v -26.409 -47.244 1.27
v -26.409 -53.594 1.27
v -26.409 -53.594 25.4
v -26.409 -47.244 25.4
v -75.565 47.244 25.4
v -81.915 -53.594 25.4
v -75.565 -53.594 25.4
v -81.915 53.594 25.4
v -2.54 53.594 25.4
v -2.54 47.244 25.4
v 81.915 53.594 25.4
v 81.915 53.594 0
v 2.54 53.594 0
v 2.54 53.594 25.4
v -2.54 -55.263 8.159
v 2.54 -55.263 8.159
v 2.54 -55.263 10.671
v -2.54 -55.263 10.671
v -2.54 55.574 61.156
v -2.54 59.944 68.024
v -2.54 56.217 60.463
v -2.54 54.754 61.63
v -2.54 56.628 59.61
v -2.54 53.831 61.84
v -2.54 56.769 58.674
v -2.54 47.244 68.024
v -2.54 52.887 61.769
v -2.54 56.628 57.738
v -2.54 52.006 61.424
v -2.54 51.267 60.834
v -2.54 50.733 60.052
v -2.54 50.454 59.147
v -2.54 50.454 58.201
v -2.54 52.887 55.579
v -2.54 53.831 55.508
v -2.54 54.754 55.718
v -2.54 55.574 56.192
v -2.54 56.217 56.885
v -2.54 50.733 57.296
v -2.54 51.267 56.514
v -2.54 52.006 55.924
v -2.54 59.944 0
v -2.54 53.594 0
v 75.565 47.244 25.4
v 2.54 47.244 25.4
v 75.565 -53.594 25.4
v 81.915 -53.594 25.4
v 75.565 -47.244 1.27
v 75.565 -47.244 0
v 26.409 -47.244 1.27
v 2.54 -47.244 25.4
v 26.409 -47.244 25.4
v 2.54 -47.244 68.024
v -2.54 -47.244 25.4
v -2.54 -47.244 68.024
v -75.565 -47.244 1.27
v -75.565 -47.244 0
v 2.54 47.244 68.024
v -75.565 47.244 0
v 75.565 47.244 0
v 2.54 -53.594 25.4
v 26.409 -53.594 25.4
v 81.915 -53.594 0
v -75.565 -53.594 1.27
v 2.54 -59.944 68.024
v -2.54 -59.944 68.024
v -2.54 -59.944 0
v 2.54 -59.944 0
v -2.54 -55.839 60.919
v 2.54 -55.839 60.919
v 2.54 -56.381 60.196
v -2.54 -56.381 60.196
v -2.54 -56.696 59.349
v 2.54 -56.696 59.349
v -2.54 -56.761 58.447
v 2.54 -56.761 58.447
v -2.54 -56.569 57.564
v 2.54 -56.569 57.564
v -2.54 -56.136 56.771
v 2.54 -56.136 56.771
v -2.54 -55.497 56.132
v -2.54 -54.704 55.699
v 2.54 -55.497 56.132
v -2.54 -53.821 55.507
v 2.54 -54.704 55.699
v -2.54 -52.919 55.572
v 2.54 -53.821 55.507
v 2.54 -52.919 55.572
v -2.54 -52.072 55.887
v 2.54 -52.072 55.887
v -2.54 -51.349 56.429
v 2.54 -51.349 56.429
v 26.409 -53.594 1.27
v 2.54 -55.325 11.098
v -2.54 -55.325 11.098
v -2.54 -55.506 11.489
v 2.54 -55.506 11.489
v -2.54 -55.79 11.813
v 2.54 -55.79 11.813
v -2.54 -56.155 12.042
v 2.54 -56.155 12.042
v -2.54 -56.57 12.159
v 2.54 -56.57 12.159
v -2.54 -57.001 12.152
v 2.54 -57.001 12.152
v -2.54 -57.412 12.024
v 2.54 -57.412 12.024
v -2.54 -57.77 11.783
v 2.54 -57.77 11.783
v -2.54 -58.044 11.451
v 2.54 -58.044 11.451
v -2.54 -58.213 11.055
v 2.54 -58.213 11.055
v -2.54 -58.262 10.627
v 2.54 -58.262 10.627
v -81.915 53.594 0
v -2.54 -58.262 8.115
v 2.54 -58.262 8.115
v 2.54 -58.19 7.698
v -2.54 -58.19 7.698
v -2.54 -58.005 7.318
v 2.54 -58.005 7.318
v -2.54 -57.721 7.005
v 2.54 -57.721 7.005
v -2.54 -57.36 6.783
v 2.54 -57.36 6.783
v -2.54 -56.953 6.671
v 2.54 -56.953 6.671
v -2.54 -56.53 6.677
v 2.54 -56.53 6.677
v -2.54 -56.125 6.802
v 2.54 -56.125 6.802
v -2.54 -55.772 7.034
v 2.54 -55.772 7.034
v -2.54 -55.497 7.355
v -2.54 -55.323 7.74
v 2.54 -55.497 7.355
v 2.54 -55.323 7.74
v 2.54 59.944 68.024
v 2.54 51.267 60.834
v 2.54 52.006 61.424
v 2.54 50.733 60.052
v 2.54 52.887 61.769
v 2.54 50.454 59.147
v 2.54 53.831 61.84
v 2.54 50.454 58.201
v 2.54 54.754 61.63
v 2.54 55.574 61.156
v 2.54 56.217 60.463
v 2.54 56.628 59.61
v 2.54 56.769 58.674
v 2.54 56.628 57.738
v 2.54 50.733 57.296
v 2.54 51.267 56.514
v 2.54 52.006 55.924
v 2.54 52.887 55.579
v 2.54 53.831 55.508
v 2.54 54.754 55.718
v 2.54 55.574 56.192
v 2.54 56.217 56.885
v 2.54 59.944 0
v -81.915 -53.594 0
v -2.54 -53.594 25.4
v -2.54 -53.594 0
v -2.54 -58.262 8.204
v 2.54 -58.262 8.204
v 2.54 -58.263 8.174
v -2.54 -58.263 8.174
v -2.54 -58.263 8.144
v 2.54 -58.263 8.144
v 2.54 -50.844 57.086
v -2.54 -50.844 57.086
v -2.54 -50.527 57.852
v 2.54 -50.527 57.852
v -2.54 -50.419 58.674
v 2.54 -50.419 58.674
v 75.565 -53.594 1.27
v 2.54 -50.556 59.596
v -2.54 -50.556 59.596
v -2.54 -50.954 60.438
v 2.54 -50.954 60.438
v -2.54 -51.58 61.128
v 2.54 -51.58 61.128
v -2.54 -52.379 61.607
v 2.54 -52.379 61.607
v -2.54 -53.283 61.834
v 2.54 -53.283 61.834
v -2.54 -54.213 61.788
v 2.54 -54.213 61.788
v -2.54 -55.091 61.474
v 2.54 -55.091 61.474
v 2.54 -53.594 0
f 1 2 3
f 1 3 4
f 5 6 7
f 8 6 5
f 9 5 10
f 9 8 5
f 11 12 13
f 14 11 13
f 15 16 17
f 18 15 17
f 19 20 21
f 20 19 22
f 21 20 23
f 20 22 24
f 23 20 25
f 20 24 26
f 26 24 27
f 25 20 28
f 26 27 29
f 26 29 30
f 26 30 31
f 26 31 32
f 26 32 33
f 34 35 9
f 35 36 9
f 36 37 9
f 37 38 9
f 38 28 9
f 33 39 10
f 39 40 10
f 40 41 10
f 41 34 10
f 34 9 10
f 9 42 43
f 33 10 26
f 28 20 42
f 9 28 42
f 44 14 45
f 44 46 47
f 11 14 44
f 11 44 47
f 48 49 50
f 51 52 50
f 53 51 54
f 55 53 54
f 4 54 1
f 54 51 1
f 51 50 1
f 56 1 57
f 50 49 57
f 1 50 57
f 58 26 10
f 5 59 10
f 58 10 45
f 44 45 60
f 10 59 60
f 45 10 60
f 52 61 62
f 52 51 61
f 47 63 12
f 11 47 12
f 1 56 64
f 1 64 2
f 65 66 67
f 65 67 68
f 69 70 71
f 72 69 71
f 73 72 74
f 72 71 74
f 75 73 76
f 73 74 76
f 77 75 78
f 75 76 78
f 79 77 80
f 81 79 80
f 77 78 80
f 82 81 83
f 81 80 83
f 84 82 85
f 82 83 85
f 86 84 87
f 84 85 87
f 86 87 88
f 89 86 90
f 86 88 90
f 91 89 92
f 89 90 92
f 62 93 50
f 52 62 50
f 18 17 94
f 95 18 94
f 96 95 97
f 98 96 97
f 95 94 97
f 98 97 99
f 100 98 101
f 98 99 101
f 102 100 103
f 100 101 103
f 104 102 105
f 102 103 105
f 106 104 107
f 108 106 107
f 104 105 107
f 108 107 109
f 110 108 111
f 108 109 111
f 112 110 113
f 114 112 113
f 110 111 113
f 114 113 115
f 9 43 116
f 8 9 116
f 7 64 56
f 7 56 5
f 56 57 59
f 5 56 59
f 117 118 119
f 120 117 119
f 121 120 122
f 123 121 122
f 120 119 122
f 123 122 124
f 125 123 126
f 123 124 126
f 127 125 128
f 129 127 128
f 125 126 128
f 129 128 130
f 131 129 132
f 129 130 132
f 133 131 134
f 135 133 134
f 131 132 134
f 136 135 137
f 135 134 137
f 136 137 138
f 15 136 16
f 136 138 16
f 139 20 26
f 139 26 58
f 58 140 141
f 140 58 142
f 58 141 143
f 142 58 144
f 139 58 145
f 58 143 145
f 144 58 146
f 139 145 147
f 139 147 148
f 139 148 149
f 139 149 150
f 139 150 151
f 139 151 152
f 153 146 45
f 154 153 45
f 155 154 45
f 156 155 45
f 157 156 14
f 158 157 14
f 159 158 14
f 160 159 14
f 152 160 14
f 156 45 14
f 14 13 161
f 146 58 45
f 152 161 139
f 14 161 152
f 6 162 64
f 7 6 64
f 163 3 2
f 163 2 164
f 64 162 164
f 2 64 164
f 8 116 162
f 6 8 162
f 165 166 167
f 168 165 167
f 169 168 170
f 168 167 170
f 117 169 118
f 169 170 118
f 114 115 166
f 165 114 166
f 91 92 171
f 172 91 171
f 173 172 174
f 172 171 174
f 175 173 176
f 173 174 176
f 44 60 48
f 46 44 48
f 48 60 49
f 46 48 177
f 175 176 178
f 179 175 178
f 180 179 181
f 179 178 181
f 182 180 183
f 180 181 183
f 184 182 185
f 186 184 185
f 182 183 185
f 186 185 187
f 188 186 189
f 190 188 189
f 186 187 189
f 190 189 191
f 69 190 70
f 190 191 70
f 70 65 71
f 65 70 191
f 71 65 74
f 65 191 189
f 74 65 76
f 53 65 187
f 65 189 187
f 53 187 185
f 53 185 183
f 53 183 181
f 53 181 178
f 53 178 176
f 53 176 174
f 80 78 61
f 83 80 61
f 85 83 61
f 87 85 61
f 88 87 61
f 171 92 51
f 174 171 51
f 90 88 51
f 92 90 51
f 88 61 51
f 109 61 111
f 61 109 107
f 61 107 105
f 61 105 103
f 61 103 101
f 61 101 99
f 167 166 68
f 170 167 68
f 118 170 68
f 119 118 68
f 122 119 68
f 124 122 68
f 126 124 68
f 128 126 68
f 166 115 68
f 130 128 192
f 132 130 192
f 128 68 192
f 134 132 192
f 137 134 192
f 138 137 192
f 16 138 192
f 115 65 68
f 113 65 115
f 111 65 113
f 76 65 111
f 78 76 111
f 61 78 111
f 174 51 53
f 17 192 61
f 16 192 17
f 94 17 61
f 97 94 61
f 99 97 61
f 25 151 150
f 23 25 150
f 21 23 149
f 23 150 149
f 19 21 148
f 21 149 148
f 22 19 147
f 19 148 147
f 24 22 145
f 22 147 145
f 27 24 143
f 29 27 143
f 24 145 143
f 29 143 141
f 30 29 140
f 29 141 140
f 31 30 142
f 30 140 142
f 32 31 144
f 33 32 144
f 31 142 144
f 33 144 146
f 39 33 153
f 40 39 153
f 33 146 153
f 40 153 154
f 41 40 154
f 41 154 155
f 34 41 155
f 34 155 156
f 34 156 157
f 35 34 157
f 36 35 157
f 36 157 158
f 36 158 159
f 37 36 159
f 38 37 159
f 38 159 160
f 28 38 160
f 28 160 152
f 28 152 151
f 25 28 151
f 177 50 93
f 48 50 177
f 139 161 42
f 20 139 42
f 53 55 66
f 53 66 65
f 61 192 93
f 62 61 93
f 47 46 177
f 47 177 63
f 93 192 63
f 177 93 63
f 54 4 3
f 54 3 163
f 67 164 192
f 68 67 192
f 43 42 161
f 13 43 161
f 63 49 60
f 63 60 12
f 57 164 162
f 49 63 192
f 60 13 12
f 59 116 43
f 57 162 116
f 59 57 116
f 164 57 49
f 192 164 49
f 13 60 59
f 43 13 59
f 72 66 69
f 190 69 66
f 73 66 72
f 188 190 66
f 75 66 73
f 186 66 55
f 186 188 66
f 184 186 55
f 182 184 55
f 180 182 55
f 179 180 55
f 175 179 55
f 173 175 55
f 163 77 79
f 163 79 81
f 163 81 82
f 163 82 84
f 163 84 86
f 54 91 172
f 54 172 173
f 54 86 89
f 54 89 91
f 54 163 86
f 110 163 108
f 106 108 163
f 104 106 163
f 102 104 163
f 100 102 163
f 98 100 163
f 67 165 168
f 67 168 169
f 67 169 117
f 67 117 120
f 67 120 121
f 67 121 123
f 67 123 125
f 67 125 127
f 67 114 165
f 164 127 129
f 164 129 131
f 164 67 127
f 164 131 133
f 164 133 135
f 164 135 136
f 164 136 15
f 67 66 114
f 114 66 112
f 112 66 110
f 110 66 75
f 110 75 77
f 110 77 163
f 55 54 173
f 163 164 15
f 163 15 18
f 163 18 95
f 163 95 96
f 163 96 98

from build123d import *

# Parameters (mm, degrees)
F0_W     = 49.1559793526
F0_H     = 6.35
F0_W_2   = 5.08
F0_W_3   = 23.8690206474
F1_DEPTH = 1.27
F2_DEPTH = 25.4
F3_W     = 5.08
F3_H     = 12.7
F4_DEPTH = 42.624
F6_DEPTH = 25.4
F7_R     = 3.175
F8_DEPTH = 25.4


with BuildPart() as f1:
    # F0 (on Top) → F1 (new body)
    with BuildSketch(Plane.XY):
        with Locations((-50.9870103237, -50.419)):
            Rectangle(F0_W, F0_H)
        Polygon((-75.565, 47.244), (-2.54, 47.244), (-2.54, 53.594), (-81.915, 53.594), (-81.915, -53.594), (-75.565, -53.594), (-75.565, -47.244), align=None)
        with Locations((0, 56.769)):
            Rectangle(F0_W_2, F0_H)
        with Locations((0, 50.419)):
            Rectangle(F0_W_2, F0_H)
        Polygon((2.54, 47.244), (75.565, 47.244), (75.565, -47.244), (75.565, -53.594), (81.915, -53.594), (81.915, 53.594), (2.54, 53.594), align=None)
        with Locations((50.9870103237, -50.419)):
            Rectangle(F0_W, F0_H)
        with Locations((-14.4745103237, -50.419)):
            Rectangle(F0_W_3, F0_H)
        with Locations((0, -50.419)):
            Rectangle(F0_W_2, F0_H)
        with Locations((14.4745103237, -50.419)):
            Rectangle(F0_W_3, F0_H)
        with Locations((0, -56.769)):
            Rectangle(F0_W_2, F0_H)
    extrude(amount=F1_DEPTH)

    # F0 (on Top) → F2 (join)
    with BuildSketch(Plane.XY):
        Polygon((-75.565, 47.244), (-2.54, 47.244), (-2.54, 53.594), (-81.915, 53.594), (-81.915, -53.594), (-75.565, -53.594), (-75.565, -47.244), align=None)
        with Locations((0, 56.769)):
            Rectangle(F0_W_2, F0_H)
        with Locations((0, 50.419)):
            Rectangle(F0_W_2, F0_H)
        Polygon((2.54, 47.244), (75.565, 47.244), (75.565, -47.244), (75.565, -53.594), (81.915, -53.594), (81.915, 53.594), (2.54, 53.594), align=None)
        with Locations((14.4745103237, -50.419)):
            Rectangle(F0_W_3, F0_H)
        with Locations((0, -50.419)):
            Rectangle(F0_W_2, F0_H)
        with Locations((-14.4745103237, -50.419)):
            Rectangle(F0_W_3, F0_H)
        with Locations((0, -56.769)):
            Rectangle(F0_W_2, F0_H)
    extrude(amount=F2_DEPTH)

    # F3 (on face) → F4 (join)
    with BuildSketch(Plane.XY.offset(25.4)):
        Polygon((2.54, 59.944), (-2.54, 59.944), (-2.54, 53.594), (-2.54, 47.244), (2.54, 47.244), (2.54, 53.594), align=None)
        with Locations((0, -53.594)):
            Rectangle(F3_W, F3_H)
    extrude(amount=F4_DEPTH)

    # F5 (on face) → F6 (cut)
    with BuildSketch(Plane.YZ.offset(2.54)):
        with BuildLine():
            Line((-58.2624942683, 8.2038091254), (-58.2624942683, 8.1145596807))
            ThreePointArc((-58.2624942683, 8.1145596807), (-56.7408433733, 6.6593503961), (-55.2631582039, 8.159184403))
            ThreePointArc((-55.2631582039, 8.159184403), (-55.4440615048, 8.8733159724), (-55.9431367352, 9.4151958643))
            ThreePointArc((-55.9431367352, 9.4151958643), (-56.7631582039, 9.1712073255), (-57.5831796726, 9.4151958643))
            ThreePointArc((-57.5831796726, 9.4151958643), (-58.0714851124, 8.8928605581), (-58.2624942683, 8.2038091254))
        make_face()
        with BuildLine():
            ThreePointArc((-58.2624942683, 8.2038091254), (-58.2631582039, 8.159184403), (-58.2624942683, 8.1145596807))
            Line((-58.2624942683, 8.1145596807), (-58.2624942683, 8.2038091254))
        make_face()
        with BuildLine():
            ThreePointArc((-55.9431367352, 9.4151958643), (-55.4440615048, 8.8733159724), (-55.2631582039, 8.159184403))
            Line((-55.2631582039, 8.159184403), (-55.2631582039, 10.6712073255))
            ThreePointArc((-55.2631582039, 10.6712073255), (-55.4440615048, 9.9570757561), (-55.9431367352, 9.4151958643))
        make_face()
        with BuildLine():
            Line((-58.2624942683, 10.6265826032), (-58.2624942683, 8.2038091254))
            ThreePointArc((-58.2624942683, 8.2038091254), (-58.0714851124, 8.8928605581), (-57.5831796726, 9.4151958643))
            ThreePointArc((-57.5831796726, 9.4151958643), (-58.0714851124, 9.9375311705), (-58.2624942683, 10.6265826032))
        make_face()
        with BuildLine():
            ThreePointArc((-57.5831796726, 9.4151958643), (-56.7631582039, 9.659184403), (-55.9431367352, 9.4151958643))
            ThreePointArc((-55.9431367352, 9.4151958643), (-55.4440615048, 9.9570757561), (-55.2631582039, 10.6712073255))
            ThreePointArc((-55.2631582039, 10.6712073255), (-56.7854730345, 12.1710413325), (-58.2624942683, 10.6265826032))
            ThreePointArc((-58.2624942683, 10.6265826032), (-58.0714851124, 9.9375311705), (-57.5831796726, 9.4151958643))
        make_face()
        with BuildLine():
            ThreePointArc((-57.5831796726, 9.4151958643), (-56.7631582039, 9.1712073255), (-55.9431367352, 9.4151958643))
            ThreePointArc((-55.9431367352, 9.4151958643), (-56.7631582039, 9.659184403), (-57.5831796726, 9.4151958643))
        make_face()
    extrude(amount=-F6_DEPTH, mode=Mode.SUBTRACT)

    # F7 (on face) → F8 (cut)
    with BuildSketch(Plane.YZ.offset(2.54)):
        with Locations((53.594, 58.674)):
            Circle(F7_R)
        with BuildLine():
            ThreePointArc((-50.419, 58.674), (-52.3789801022, 61.6073175157), (-55.8390640303, 60.9190640303))
            Line((-55.8390640303, 60.9190640303), (-51.3489359697, 56.4289359697))
            ThreePointArc((-51.3489359697, 56.4289359697), (-50.6606824843, 57.4589801022), (-50.419, 58.674))
        make_face()
        with BuildLine():
            Line((-51.3489359697, 56.4289359697), (-55.8390640303, 60.9190640303))
            ThreePointArc((-55.8390640303, 60.9190640303), (-55.8390640303, 56.4289359697), (-51.3489359697, 56.4289359697))
        make_face()
    extrude(amount=-F8_DEPTH, mode=Mode.SUBTRACT)


solid = f1.part
